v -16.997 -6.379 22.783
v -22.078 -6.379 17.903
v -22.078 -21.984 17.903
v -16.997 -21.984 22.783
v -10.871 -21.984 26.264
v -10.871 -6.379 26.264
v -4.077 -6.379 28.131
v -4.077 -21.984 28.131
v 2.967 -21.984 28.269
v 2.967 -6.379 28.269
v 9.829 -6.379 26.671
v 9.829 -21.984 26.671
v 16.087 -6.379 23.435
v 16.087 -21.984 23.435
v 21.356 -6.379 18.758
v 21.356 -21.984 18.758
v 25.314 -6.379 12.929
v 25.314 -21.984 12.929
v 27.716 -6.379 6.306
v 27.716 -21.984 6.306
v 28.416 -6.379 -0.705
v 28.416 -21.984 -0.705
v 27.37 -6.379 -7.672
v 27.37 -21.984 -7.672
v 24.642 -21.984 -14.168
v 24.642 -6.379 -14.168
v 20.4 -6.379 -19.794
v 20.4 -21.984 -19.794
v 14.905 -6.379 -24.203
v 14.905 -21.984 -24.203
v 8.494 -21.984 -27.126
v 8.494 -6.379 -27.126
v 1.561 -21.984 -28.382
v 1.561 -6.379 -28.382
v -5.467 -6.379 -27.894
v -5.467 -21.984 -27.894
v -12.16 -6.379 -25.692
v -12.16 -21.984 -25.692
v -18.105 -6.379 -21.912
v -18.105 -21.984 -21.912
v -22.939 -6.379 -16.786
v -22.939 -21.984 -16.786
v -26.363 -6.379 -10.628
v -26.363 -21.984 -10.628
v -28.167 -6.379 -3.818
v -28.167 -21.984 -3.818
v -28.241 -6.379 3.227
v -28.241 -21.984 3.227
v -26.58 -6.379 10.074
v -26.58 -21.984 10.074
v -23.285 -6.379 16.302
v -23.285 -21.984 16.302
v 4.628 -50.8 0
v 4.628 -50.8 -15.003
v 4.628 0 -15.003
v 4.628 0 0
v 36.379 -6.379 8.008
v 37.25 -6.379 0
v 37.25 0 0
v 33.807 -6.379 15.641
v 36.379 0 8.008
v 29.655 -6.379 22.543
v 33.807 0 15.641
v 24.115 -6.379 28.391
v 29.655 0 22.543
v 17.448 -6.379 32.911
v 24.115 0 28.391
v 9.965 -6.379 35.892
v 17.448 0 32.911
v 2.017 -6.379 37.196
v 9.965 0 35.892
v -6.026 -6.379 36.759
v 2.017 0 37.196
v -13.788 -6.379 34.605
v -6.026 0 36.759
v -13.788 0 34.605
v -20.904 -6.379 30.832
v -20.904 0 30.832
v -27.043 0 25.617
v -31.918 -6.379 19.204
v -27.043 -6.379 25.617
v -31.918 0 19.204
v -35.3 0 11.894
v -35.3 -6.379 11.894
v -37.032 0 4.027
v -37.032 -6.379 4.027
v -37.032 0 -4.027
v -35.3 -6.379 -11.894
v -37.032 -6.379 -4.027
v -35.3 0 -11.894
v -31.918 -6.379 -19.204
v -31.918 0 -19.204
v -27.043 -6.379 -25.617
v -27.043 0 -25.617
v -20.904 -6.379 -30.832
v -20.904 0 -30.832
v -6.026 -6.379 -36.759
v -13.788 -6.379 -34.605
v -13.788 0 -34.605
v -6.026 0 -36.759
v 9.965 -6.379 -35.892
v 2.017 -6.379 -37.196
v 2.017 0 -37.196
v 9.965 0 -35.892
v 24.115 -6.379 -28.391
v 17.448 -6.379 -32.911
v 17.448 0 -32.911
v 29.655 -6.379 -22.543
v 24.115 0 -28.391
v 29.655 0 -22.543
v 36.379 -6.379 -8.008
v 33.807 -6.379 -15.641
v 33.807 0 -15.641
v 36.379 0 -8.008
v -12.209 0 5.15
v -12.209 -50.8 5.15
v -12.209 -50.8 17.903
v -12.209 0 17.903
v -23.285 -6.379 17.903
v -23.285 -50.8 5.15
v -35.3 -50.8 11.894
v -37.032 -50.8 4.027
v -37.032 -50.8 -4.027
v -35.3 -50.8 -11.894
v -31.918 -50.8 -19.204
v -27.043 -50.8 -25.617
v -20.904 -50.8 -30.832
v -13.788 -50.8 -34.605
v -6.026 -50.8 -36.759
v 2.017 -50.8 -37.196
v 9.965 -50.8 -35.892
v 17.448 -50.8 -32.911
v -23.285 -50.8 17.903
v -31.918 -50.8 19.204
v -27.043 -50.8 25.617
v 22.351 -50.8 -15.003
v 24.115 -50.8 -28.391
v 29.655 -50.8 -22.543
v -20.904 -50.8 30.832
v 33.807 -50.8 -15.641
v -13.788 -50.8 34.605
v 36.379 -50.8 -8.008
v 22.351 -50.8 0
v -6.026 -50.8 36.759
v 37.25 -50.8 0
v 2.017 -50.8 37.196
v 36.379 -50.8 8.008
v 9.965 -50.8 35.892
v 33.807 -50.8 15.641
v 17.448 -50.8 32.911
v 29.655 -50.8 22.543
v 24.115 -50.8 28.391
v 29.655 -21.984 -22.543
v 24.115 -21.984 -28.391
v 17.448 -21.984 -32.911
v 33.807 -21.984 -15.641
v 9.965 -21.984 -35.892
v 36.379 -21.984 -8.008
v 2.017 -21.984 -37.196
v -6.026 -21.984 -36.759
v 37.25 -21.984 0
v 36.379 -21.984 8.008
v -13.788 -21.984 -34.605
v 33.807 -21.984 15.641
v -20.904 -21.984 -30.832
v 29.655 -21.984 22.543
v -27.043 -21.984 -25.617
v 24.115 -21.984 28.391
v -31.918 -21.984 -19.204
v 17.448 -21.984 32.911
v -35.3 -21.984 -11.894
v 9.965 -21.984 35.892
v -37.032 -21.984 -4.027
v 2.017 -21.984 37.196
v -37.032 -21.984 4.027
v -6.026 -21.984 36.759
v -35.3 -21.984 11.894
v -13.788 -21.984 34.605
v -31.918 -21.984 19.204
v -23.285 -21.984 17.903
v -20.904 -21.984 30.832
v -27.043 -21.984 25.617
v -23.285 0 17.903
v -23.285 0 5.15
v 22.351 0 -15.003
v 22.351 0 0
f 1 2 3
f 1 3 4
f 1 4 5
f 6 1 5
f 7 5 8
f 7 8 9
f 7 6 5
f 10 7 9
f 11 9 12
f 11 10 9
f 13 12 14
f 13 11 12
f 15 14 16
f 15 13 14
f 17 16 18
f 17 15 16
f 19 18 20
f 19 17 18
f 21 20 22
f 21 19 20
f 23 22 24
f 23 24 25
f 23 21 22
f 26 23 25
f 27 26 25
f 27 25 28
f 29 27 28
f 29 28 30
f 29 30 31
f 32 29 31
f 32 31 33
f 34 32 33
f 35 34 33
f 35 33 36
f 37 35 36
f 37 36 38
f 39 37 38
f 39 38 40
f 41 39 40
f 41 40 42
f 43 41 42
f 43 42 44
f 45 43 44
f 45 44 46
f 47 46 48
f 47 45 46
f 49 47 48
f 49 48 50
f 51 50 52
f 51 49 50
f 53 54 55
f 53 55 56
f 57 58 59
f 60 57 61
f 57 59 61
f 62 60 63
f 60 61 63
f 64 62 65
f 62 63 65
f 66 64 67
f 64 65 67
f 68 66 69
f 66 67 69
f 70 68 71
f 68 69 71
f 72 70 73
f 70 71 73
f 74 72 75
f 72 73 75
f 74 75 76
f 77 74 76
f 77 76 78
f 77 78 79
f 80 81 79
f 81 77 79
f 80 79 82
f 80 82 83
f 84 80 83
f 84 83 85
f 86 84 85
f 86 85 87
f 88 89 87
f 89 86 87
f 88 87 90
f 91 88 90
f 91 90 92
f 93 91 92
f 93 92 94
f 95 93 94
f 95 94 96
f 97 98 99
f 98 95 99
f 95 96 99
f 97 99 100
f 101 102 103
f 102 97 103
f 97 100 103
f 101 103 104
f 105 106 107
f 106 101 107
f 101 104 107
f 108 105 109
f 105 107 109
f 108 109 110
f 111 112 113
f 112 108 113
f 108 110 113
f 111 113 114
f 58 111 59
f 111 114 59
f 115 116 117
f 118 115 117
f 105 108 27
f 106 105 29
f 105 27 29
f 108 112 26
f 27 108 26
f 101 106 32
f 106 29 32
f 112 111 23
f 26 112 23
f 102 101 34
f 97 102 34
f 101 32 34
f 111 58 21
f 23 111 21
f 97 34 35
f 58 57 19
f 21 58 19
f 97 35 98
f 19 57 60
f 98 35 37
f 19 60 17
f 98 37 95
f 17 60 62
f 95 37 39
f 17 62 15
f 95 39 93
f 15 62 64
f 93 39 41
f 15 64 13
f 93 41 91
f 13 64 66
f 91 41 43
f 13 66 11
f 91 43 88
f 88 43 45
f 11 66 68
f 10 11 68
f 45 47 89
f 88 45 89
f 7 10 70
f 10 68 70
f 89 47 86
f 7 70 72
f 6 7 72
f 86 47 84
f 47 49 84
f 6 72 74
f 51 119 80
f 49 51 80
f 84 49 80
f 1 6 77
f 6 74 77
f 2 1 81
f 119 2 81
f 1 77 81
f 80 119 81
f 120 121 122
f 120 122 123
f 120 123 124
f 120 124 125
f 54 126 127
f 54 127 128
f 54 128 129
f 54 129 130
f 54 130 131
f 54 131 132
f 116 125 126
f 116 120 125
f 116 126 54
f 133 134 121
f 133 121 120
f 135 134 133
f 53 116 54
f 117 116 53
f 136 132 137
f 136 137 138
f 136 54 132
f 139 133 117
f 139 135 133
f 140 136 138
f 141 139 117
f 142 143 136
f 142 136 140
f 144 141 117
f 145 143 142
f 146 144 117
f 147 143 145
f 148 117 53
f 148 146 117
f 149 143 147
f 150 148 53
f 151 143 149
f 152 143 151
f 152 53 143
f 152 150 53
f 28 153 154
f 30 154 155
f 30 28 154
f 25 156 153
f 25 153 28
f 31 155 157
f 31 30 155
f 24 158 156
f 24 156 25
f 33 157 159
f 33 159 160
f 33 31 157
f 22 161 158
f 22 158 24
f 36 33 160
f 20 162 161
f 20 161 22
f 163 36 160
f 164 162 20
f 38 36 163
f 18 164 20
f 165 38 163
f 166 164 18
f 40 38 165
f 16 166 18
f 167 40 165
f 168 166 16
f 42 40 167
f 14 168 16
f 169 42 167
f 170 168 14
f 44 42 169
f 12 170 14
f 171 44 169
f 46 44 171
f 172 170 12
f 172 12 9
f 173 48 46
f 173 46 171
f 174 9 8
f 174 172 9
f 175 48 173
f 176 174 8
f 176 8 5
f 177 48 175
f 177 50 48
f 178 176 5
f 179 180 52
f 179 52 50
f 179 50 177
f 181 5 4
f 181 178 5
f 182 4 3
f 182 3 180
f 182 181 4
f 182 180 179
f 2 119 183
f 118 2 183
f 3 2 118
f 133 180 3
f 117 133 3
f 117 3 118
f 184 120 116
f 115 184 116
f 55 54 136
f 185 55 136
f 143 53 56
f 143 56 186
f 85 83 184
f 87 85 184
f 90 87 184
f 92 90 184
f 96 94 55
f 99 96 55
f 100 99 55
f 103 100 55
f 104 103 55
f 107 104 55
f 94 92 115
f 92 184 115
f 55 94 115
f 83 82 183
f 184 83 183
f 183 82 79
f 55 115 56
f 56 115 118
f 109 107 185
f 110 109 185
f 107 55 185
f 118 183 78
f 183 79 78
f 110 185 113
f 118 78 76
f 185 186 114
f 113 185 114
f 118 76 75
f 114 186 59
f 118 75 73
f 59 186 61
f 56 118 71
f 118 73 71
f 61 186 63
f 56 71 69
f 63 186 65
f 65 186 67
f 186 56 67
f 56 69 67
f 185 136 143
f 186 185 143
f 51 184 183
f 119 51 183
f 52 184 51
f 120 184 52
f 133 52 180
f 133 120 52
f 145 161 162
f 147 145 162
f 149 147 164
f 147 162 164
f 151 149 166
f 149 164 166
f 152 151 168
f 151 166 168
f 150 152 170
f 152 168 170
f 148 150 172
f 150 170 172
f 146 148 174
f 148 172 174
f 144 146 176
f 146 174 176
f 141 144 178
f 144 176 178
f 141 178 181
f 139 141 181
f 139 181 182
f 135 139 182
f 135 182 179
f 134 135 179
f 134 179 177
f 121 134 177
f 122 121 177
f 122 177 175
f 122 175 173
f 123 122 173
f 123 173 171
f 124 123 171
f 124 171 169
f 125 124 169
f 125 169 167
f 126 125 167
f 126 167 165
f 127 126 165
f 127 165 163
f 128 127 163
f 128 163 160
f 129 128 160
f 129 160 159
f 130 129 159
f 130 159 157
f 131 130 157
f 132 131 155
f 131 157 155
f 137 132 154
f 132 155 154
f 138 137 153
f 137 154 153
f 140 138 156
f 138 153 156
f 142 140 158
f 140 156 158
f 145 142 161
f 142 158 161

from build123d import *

# Parameters (mm, degrees)
F0_R     = 37.250135
F1_DEPTH = 50.8
F2_W     = 11.076774
F2_H     = 12.752968
F2_W_2   = 17.722838
F2_H_2   = 15.002562
F3_DEPTH = 50.8
F4_W     = 13.871703
F4_H     = 15.605667


with BuildPart() as f1:
    # F0 (on Front) → F1 (new body)
    with BuildSketch(Plane.XZ):
        Circle(F0_R)
    extrude(amount=F1_DEPTH)

    # F2 (on face) → F3 (cut)
    with BuildSketch(Plane.XZ.offset(50.8)):
        with Locations((-17.74689, 11.526265)):
            Rectangle(F2_W, F2_H)
        with Locations((13.489608, -7.501281)):
            Rectangle(F2_W_2, F2_H_2)
    extrude(amount=-F3_DEPTH, mode=Mode.SUBTRACT)

    # F4 (on Top) → F6 (revolve, cut)
    with BuildSketch(Plane.XY):
        with Locations((-35.360457, -14.181339)):
            Rectangle(F4_W, F4_H)
    revolve(axis=Axis((0, 18.854436, 0), (0, 1, 0)), mode=Mode.SUBTRACT)


solid = f1.part
